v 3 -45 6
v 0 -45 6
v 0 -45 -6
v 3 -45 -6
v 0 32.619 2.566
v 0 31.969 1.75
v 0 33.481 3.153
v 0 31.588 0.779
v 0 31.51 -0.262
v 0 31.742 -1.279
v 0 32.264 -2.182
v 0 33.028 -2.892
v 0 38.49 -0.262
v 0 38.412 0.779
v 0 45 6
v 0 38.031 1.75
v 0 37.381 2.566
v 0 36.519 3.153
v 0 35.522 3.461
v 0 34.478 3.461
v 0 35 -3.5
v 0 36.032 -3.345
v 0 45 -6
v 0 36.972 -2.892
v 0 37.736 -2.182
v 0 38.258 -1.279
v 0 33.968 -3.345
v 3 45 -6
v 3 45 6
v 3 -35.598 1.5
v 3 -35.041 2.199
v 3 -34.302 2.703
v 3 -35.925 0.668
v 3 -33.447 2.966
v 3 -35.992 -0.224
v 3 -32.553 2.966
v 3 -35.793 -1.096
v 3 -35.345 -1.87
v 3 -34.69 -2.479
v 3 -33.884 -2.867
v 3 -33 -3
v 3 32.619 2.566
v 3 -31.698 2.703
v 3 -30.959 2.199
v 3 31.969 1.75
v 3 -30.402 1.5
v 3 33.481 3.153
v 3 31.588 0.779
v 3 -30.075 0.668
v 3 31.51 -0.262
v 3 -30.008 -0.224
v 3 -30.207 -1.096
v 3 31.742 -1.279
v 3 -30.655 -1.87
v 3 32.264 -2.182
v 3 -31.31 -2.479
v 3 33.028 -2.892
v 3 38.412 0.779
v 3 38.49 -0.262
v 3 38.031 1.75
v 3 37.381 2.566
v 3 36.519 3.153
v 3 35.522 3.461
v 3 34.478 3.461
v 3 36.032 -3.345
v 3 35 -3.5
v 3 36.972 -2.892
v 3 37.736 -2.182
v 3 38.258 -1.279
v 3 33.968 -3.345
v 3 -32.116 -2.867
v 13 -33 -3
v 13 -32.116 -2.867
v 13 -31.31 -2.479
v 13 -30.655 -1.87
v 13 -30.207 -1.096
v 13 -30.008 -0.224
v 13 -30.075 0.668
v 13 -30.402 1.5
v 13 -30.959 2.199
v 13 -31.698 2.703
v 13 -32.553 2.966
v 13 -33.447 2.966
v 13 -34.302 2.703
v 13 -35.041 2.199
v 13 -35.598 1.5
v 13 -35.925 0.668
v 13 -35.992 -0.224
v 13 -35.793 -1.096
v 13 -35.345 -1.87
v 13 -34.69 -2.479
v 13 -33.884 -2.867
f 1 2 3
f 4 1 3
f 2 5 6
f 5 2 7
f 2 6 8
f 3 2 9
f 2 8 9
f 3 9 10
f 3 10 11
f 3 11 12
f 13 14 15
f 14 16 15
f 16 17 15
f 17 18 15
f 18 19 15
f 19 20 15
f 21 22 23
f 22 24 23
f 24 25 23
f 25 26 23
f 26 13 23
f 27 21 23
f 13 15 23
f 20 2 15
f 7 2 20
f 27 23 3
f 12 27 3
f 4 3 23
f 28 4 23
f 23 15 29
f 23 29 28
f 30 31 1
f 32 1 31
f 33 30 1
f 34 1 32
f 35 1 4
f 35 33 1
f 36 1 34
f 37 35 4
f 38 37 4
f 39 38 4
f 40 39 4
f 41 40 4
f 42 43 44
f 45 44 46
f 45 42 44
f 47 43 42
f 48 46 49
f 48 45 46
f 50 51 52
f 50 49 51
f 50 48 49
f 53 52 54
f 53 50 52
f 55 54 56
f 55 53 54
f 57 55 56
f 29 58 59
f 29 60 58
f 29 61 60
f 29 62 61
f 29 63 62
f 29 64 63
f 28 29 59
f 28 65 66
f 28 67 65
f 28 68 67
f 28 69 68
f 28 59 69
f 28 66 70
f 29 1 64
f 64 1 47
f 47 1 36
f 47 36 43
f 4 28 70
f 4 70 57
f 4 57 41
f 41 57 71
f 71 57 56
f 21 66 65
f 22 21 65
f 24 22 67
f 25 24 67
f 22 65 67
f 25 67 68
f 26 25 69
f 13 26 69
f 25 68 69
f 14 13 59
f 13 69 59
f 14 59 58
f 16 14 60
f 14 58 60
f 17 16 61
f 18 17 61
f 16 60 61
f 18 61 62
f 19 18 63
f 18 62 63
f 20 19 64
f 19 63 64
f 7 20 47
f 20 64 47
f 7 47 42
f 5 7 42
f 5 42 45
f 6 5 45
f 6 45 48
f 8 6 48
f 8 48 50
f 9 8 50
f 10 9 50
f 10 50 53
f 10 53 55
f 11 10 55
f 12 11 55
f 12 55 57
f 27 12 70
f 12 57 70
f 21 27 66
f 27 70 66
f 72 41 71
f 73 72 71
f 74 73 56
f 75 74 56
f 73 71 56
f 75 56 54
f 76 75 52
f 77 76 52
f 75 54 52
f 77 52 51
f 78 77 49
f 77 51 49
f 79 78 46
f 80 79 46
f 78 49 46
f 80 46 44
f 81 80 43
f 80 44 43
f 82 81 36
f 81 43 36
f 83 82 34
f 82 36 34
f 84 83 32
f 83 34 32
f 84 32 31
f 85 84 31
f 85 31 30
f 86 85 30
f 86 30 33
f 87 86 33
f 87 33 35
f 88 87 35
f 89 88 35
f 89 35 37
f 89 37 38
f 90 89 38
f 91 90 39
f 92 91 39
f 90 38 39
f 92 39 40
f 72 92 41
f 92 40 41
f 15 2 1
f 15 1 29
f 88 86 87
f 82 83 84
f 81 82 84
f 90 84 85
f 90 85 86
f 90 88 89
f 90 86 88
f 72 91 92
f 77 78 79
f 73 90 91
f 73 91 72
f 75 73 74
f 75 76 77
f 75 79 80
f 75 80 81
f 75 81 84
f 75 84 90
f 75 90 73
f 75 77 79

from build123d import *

# Parameters (mm, degrees)
SKETCH1_W           = 12
SKETCH1_H           = 90
BOSS_EXTRUDE1_DEPTH = 3
SKETCH2_R           = 3.5
CUT_EXTRUDE1_DEPTH  = 3
SKETCH3_R           = 3
BOSS_EXTRUDE2_DEPTH = 10


with BuildPart() as part:
    # Sketch1 → Boss-Extrude1 (new body)
    with BuildSketch(Plane(origin=(0, 0, 0), x_dir=(0, 0, -1), z_dir=(1, 0, 0))):
        Rectangle(SKETCH1_W, SKETCH1_H)
    extrude(amount=BOSS_EXTRUDE1_DEPTH)

    # Sketch2 → Cut-Extrude1 (cut)
    with BuildSketch(Plane(origin=(3, 0, 0), x_dir=(0, 0, -1), z_dir=(1, 0, 0))):
        with Locations((0, 35)):
            Circle(SKETCH2_R)
    extrude(amount=-CUT_EXTRUDE1_DEPTH, mode=Mode.SUBTRACT)

    # Sketch3 → Boss-Extrude2 (add)
    with BuildSketch(Plane(origin=(3, 0, 0), x_dir=(0, 0, -1), z_dir=(1, 0, 0))):
        with Locations((0, -33)):
            Circle(SKETCH3_R)
    extrude(amount=BOSS_EXTRUDE2_DEPTH)


solid = part.part
